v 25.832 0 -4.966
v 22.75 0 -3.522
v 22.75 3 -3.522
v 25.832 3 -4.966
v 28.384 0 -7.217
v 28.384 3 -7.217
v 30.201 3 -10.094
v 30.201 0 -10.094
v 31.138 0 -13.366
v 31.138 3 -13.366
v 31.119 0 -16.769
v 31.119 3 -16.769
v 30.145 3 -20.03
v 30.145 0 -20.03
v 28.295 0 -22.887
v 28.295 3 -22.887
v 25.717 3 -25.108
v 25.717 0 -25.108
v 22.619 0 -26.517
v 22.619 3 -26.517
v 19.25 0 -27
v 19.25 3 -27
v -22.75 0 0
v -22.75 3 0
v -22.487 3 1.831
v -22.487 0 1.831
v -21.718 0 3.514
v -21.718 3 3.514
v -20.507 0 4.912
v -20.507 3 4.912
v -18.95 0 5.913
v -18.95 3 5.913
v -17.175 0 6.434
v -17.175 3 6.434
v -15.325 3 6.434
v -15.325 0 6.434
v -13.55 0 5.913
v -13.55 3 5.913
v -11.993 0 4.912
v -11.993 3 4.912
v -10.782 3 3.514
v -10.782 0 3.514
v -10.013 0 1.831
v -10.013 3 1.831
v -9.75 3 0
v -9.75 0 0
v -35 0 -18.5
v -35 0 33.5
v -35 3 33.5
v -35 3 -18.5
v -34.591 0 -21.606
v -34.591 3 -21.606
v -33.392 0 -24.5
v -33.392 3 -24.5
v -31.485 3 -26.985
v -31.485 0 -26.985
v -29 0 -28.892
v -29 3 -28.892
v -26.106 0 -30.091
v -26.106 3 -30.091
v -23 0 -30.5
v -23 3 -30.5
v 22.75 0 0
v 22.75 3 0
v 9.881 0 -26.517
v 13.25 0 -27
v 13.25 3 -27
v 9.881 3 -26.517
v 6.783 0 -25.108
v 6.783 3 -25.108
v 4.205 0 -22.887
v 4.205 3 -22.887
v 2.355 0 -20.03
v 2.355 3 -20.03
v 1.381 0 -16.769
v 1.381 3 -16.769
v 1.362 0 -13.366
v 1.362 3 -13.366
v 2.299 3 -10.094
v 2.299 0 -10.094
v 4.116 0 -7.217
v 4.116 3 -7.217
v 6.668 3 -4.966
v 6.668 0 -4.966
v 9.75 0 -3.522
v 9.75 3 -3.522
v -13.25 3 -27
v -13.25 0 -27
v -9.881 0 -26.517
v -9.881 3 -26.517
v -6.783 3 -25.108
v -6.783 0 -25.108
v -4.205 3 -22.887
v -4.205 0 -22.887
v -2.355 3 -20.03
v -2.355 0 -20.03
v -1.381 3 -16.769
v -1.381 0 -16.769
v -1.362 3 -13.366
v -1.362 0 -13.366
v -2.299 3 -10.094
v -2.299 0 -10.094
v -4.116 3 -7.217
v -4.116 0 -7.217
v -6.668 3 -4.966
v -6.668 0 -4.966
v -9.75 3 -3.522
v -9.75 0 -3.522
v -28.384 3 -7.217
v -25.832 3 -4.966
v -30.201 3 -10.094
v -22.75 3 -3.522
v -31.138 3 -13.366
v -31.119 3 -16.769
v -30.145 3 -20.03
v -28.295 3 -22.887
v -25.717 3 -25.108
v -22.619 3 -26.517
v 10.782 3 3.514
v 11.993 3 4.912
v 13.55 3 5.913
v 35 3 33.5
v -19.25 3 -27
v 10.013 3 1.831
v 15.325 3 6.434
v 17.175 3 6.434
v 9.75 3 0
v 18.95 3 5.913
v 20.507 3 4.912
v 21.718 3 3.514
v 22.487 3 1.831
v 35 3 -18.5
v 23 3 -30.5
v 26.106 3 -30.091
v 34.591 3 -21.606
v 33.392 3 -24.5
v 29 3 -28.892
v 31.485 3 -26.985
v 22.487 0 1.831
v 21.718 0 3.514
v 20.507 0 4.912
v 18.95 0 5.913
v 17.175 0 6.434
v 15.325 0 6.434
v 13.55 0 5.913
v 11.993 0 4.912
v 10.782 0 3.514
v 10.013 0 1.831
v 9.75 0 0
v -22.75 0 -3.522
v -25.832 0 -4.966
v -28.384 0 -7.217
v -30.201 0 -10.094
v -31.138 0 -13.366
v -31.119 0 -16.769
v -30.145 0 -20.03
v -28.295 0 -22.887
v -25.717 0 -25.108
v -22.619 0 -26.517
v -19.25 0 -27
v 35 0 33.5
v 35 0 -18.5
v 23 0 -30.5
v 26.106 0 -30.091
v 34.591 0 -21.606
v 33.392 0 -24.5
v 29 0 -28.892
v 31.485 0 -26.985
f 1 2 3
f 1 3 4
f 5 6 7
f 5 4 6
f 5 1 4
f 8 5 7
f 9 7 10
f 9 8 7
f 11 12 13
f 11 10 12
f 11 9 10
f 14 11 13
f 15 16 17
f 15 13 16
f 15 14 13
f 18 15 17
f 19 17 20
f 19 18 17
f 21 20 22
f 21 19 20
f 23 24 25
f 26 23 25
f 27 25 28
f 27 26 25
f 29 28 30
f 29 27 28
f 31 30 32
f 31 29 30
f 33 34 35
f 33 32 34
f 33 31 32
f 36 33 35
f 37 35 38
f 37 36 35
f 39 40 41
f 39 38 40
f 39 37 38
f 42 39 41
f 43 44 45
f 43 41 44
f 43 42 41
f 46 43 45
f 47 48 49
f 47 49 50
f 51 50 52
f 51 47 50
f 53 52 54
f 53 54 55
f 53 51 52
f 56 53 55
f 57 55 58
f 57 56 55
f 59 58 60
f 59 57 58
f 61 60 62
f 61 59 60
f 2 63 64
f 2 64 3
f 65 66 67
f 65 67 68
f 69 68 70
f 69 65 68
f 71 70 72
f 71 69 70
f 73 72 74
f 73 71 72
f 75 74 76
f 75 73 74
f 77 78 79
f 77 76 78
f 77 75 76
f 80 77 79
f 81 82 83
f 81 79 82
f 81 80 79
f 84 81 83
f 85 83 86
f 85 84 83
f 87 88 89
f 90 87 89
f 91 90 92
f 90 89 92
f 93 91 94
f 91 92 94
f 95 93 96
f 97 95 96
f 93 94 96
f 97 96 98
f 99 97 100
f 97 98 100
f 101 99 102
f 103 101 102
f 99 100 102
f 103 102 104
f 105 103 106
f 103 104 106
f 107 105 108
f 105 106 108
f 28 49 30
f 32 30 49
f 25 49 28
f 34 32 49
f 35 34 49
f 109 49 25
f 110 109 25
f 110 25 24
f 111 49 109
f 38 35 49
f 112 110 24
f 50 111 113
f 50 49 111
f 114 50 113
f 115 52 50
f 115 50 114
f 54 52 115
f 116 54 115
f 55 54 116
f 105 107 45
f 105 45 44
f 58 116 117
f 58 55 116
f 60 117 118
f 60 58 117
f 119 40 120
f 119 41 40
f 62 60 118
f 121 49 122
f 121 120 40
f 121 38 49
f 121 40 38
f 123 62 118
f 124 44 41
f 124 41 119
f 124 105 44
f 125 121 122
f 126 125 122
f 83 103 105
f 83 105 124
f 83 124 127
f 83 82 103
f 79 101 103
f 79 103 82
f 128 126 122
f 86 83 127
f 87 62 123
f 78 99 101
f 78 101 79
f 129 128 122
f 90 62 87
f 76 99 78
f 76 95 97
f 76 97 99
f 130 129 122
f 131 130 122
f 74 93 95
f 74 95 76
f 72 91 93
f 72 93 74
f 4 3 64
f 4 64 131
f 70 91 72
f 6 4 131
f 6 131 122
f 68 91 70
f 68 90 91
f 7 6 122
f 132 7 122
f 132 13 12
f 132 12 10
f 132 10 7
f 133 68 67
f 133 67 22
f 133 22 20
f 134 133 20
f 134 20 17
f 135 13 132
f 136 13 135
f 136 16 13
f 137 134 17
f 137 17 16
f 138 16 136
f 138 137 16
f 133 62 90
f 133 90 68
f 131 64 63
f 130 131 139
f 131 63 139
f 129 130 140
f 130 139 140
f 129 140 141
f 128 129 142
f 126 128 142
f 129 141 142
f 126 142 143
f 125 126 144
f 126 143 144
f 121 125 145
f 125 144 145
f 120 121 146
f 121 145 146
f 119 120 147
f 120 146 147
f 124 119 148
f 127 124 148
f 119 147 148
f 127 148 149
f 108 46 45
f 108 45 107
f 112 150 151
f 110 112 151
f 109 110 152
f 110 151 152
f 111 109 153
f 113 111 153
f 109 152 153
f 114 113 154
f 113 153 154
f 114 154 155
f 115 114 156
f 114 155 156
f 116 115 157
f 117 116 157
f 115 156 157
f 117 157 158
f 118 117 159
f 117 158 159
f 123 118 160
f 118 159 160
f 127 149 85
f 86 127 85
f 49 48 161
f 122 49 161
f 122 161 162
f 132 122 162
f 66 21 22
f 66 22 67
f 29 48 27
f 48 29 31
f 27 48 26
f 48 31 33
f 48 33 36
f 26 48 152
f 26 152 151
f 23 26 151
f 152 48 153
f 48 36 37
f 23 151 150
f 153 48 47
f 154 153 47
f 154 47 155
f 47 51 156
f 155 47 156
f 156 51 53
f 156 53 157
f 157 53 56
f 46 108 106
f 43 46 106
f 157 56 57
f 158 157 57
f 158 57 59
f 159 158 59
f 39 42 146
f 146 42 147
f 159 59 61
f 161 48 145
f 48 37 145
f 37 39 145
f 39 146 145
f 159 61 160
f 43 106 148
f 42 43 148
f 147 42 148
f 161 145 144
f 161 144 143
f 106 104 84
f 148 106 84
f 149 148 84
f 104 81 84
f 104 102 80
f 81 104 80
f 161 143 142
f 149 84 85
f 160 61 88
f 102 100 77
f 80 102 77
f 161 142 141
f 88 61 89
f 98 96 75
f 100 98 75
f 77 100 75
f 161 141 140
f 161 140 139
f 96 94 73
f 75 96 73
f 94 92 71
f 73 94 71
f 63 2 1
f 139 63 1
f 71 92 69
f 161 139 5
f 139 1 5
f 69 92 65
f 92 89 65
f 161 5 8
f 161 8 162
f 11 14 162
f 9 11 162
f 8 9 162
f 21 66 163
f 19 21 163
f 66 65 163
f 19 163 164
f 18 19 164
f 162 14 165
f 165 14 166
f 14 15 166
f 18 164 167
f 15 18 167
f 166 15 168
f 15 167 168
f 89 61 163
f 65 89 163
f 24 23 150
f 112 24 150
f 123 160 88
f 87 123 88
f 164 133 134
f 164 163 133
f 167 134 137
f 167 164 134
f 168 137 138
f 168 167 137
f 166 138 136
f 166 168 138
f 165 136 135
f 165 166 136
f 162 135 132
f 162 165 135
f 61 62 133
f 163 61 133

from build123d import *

# Parameters (mm, degrees)
SKETCH1_W               = 70
SKETCH1_H               = 67
BOSS_EXTRUDE1_DEPTH     = 3
SKETCH5_W               = 70
SKETCH5_H               = 3
CUT_EXTRUDE4_DEPTH      = 1
CUT_EXTRUDE4_DEPTH_BACK = 4
FILLET1_R               = 12
CUT_EXTRUDE1_START      = -4
SKETCH2_R               = 6.5
CUT_EXTRUDE1_DEPTH      = 5
CUT_EXTRUDE2_START      = -4
CUT_EXTRUDE2_DEPTH      = 5
CUT_EXTRUDE3_START      = -4
SKETCH4_W               = 13
SKETCH4_H               = 8.828059947
CUT_EXTRUDE3_DEPTH      = 5


with BuildPart() as part:
    # Sketch1 → Boss-Extrude1 (new body)
    with BuildSketch(Plane(origin=(0, 0, 0), x_dir=(1, 0, 0), z_dir=(0, 1, 0))):
        Rectangle(SKETCH1_W, SKETCH1_H)
    extrude(amount=BOSS_EXTRUDE1_DEPTH)

    # Sketch5 → Cut-Extrude4 (cut, two sides)
    with BuildSketch(Plane(origin=(0, 3, 0), x_dir=(1, 0, 0), z_dir=(0, 1, 0))) as cut_extrude4_sk:
        with Locations((0, 32)):
            Rectangle(SKETCH5_W, SKETCH5_H)
    extrude(amount=CUT_EXTRUDE4_DEPTH, mode=Mode.SUBTRACT)
    extrude(cut_extrude4_sk.sketch, amount=-CUT_EXTRUDE4_DEPTH_BACK, mode=Mode.SUBTRACT)

    # Fillet1
    fillet1_edges = [part.edges().sort_by_distance(p)[0] for p in [
        (-35, 1.5, -30.5),
        (35, 1.5, -30.5),
    ]]
    fillet(fillet1_edges, radius=FILLET1_R)

    # Sketch2 → Cut-Extrude1 (cut)
    with BuildSketch(Plane(origin=(0, 3, 0), x_dir=(1, 0, 0), z_dir=(0, 1, 0)).offset(CUT_EXTRUDE1_START)):
        with Locations((-16.25, 0)):
            Circle(SKETCH2_R)
    cut_extrude1 = extrude(amount=CUT_EXTRUDE1_DEPTH, mode=Mode.SUBTRACT)

    # Sketch3 → Cut-Extrude2 (cut)
    with BuildSketch(Plane(origin=(0, 3, 0), x_dir=(1, 0, 0), z_dir=(0, 1, 0)).offset(CUT_EXTRUDE2_START)):
        with BuildLine():
            Line((-19.25, 27), (-13.25, 27))
            ThreePointArc((-13.25, 27), (-1.25, 15), (-13.25, 3))
            Line((-13.25, 3), (-19.25, 3))
            ThreePointArc((-19.25, 3), (-31.25, 15), (-19.25, 27))
        make_face()
    cut_extrude2 = extrude(amount=CUT_EXTRUDE2_DEPTH, mode=Mode.SUBTRACT)

    # Sketch4 → Cut-Extrude3 (cut)
    with BuildSketch(Plane(origin=(0, 3, 0), x_dir=(1, 0, 0), z_dir=(0, 1, 0)).offset(CUT_EXTRUDE3_START)):
        with Locations((-16.25, 4.414029973)):
            Rectangle(SKETCH4_W, SKETCH4_H)
    cut_extrude3 = extrude(amount=CUT_EXTRUDE3_DEPTH, mode=Mode.SUBTRACT)

    # Mirror1: Cut-Extrude1, Cut-Extrude2, Cut-Extrude3 across plane
    add(cut_extrude1.mirror(Plane(origin=(0, 0, 0), x_dir=(0, 0, 1), z_dir=(1, 0, 0))), mode=Mode.SUBTRACT)
    add(cut_extrude2.mirror(Plane(origin=(0, 0, 0), x_dir=(0, 0, 1), z_dir=(1, 0, 0))), mode=Mode.SUBTRACT)
    add(cut_extrude3.mirror(Plane(origin=(0, 0, 0), x_dir=(0, 0, 1), z_dir=(1, 0, 0))), mode=Mode.SUBTRACT)


solid = part.part
